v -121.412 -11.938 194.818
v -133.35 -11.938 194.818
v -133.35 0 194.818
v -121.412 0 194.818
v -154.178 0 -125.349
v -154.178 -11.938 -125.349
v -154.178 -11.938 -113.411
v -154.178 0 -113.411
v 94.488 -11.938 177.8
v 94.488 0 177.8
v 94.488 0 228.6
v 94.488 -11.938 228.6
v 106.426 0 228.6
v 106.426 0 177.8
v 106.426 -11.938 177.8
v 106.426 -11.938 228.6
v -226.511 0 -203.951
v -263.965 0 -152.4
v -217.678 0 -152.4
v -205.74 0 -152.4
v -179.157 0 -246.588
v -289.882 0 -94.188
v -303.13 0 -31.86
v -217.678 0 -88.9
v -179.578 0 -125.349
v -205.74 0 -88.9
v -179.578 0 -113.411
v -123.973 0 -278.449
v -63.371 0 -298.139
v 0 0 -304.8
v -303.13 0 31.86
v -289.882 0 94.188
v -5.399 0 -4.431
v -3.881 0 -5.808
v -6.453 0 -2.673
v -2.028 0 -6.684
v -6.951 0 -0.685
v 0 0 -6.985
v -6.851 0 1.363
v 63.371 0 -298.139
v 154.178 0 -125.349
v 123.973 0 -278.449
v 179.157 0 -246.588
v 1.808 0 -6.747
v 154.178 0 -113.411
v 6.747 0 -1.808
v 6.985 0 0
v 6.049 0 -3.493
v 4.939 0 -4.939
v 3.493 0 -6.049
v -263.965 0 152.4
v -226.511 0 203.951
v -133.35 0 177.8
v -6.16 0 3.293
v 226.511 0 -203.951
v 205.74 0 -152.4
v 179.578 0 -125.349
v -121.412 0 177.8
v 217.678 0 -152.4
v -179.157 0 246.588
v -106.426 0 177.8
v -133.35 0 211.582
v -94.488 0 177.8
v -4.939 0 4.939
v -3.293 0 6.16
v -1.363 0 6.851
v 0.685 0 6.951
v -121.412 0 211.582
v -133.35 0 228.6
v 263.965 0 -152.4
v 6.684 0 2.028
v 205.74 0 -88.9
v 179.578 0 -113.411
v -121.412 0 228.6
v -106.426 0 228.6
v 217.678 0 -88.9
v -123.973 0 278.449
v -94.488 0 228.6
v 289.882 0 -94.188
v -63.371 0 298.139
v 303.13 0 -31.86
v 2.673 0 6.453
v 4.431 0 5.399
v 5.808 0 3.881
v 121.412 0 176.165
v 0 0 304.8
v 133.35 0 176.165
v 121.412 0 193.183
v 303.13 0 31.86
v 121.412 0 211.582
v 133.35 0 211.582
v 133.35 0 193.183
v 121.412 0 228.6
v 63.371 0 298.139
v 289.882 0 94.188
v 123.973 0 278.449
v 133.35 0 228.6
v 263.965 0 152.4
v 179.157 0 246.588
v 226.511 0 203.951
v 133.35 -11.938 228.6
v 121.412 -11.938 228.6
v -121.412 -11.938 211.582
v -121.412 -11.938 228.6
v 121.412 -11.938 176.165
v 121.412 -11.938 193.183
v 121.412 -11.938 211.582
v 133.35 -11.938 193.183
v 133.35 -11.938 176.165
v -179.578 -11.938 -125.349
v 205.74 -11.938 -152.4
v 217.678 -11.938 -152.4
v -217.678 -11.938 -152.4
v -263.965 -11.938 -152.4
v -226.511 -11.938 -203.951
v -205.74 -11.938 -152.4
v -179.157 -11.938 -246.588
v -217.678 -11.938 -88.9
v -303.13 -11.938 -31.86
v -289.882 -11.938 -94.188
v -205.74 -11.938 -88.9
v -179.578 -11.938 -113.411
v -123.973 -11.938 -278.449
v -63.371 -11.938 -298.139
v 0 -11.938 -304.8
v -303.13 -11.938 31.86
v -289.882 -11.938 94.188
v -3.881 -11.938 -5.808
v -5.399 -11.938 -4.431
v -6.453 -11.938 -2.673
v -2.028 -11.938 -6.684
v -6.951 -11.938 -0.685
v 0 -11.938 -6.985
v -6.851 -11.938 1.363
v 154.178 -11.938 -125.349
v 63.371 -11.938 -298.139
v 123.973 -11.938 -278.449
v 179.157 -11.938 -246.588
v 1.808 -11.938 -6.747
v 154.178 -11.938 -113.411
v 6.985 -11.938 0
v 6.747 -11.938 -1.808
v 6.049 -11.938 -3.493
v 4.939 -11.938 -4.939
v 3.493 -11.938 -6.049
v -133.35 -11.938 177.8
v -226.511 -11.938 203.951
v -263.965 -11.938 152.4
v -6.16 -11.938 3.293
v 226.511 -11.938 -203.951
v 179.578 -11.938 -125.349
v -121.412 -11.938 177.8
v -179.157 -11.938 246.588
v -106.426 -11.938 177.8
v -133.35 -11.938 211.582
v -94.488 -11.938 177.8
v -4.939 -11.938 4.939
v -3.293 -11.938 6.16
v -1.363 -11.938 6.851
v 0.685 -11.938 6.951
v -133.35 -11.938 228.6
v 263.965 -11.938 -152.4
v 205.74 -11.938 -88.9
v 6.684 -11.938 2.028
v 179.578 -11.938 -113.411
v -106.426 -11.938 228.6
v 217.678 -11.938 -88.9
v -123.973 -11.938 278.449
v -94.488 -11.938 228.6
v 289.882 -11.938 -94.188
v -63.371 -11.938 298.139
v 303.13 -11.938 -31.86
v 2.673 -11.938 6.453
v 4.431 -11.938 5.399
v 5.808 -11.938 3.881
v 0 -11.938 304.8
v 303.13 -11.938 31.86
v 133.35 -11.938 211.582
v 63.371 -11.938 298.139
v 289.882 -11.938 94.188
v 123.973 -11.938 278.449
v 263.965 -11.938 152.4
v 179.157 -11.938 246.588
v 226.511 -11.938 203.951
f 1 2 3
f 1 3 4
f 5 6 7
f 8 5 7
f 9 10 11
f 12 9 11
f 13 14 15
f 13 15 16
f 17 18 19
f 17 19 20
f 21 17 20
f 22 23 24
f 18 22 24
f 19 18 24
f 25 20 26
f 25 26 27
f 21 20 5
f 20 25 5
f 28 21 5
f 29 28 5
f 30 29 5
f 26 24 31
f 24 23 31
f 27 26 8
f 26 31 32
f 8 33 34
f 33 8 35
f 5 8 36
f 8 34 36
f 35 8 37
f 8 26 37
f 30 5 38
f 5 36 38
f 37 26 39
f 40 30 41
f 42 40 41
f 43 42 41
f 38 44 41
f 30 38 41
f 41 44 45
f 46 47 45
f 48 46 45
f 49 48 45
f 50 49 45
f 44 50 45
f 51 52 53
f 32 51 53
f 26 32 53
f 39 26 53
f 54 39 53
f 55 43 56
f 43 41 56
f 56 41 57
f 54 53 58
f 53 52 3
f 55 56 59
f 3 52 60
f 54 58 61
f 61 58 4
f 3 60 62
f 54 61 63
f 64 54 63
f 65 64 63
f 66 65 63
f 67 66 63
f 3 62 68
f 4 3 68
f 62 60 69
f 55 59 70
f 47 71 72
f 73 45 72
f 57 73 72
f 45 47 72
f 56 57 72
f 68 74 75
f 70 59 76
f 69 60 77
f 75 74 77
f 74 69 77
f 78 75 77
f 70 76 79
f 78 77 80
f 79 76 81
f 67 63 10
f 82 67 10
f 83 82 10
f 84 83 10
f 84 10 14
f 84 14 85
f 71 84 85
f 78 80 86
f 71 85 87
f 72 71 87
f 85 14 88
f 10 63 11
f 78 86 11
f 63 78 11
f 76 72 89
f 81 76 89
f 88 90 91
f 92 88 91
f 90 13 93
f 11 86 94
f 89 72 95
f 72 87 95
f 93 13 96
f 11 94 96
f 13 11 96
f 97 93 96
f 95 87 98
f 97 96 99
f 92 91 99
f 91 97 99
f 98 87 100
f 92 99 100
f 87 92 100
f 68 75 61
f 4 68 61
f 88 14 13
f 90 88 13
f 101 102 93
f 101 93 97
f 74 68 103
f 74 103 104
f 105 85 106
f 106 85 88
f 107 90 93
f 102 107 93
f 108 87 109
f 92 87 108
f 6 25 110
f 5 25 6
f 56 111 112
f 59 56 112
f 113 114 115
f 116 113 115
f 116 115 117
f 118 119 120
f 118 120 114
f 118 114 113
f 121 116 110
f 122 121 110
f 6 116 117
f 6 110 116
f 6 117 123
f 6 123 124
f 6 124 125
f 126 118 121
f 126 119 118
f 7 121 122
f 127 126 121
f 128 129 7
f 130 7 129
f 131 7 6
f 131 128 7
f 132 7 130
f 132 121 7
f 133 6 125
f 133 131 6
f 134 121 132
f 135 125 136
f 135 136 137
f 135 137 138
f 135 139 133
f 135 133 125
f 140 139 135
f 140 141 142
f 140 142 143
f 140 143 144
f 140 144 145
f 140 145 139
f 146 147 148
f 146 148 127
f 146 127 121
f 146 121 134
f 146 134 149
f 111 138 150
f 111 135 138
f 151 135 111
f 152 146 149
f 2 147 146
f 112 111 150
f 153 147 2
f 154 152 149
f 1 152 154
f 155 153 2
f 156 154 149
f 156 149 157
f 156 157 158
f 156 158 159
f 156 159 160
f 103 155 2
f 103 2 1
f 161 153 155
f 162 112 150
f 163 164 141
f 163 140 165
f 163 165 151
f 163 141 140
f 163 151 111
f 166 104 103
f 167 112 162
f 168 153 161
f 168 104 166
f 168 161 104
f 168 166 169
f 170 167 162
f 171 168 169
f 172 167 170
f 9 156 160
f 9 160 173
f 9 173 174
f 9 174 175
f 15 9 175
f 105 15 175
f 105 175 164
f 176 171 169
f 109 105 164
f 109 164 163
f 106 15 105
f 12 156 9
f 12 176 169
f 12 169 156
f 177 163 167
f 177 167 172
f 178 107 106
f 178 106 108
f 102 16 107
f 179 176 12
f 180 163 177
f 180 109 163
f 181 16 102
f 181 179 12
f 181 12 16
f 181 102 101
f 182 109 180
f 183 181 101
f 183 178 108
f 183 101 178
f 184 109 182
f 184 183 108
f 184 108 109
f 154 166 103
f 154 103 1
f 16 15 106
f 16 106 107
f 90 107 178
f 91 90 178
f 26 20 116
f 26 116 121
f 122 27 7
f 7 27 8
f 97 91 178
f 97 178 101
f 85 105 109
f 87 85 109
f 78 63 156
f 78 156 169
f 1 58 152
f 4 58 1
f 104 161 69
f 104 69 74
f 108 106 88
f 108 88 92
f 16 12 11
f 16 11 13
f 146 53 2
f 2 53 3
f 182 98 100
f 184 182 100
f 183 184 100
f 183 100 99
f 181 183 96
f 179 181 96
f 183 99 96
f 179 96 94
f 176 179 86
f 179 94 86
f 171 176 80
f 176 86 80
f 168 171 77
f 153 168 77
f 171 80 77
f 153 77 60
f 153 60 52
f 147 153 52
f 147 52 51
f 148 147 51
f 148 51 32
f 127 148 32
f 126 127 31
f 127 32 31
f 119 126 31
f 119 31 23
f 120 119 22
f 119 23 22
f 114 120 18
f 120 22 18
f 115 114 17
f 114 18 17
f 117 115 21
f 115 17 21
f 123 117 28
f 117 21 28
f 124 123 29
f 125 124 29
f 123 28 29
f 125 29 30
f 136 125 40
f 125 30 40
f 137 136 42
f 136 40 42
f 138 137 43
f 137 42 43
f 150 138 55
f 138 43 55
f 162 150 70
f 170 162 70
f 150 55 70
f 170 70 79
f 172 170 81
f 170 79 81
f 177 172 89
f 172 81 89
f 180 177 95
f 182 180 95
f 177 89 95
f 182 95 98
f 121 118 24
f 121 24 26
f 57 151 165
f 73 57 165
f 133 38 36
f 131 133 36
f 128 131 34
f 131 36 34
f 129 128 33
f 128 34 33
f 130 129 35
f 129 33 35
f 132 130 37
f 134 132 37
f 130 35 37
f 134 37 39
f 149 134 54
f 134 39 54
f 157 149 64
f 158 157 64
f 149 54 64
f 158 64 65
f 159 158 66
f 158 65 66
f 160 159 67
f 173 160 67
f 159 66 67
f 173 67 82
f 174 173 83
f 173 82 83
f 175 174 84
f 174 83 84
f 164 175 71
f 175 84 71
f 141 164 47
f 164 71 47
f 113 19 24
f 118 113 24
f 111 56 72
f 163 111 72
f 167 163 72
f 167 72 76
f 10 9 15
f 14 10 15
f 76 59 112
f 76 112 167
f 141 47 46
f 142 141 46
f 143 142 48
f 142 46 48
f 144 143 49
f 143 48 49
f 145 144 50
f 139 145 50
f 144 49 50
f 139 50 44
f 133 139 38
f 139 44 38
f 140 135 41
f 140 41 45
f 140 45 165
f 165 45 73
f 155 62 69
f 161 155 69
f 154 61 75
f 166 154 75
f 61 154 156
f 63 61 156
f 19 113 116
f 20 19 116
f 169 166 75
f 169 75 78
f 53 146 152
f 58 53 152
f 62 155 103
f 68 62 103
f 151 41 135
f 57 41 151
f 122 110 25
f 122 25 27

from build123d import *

# Parameters (mm, degrees)
F0_W     = 11.938
F0_H     = 17.018
F0_H_2   = 50.8
F0_H_3   = 63.5
F0_W_2   = 25.4
F0_H_4   = 11.938
F1_DEPTH = 11.938


with BuildPart() as f1:
    # F0 (on Front) → F1 (new body)
    with BuildSketch(Plane.XZ):
        with BuildLine():
            Line((0, 152.4), (263.9645430735, 152.4))
            ThreePointArc((263.9645430735, 152.4), (152.4, 263.9645430735), (0, 304.8))
            Line((0, 304.8), (0, 228.6))
            Line((0, 228.6), (0, 152.4))
        make_face()
        with Locations((127.381, 184.6740592089)):
            Rectangle(F0_W, F0_H, mode=Mode.SUBTRACT)
        with Locations((100.457, 203.2)):
            Rectangle(F0_W, F0_H_2, mode=Mode.SUBTRACT)
        with Locations((127.381, 220.091)):
            Rectangle(F0_W, F0_H, mode=Mode.SUBTRACT)
        with BuildLine():
            ThreePointArc((0, 304.8), (-152.4, 263.9645430735), (-263.9645430735, 152.4))
            Line((-263.9645430735, 152.4), (0, 152.4))
            Line((0, 152.4), (0, 228.6))
            Line((0, 228.6), (0, 304.8))
        make_face()
        with Locations((-127.381, 186.309)):
            Rectangle(F0_W, F0_H, mode=Mode.SUBTRACT)
        with Locations((-127.381, 220.091)):
            Rectangle(F0_W, F0_H, mode=Mode.SUBTRACT)
        with Locations((-100.457, 203.2)):
            Rectangle(F0_W, F0_H_2, mode=Mode.SUBTRACT)
        with BuildLine():
            ThreePointArc((-263.9645430735, 152.4), (-78.8880449472, -294.4141918529), (304.8, 0))
            ThreePointArc((304.8, 0), (294.4141918529, 78.8880449472), (263.9645430735, 152.4))
            Line((263.9645430735, 152.4), (0, 152.4))
            Line((0, 152.4), (-263.9645430735, 152.4))
        make_face()
        with Locations((-211.709, -120.65)):
            Rectangle(F0_W, F0_H_3, mode=Mode.SUBTRACT)
        with Locations((-166.878, -119.38)):
            Rectangle(F0_W_2, F0_H_4, mode=Mode.SUBTRACT)
        with Locations((166.878, -119.38)):
            Rectangle(F0_W_2, F0_H_4, mode=Mode.SUBTRACT)
        with Locations((211.709, -120.65)):
            Rectangle(F0_W, F0_H_3, mode=Mode.SUBTRACT)
        with BuildLine():
            ThreePointArc((0, -6.985), (-4.9391408666, 4.9391408666), (6.985, 0))
            ThreePointArc((6.985, 0), (4.9391408666, -4.9391408666), (0, -6.985))
        make_face(mode=Mode.SUBTRACT)
    extrude(amount=F1_DEPTH)


solid = f1.part
